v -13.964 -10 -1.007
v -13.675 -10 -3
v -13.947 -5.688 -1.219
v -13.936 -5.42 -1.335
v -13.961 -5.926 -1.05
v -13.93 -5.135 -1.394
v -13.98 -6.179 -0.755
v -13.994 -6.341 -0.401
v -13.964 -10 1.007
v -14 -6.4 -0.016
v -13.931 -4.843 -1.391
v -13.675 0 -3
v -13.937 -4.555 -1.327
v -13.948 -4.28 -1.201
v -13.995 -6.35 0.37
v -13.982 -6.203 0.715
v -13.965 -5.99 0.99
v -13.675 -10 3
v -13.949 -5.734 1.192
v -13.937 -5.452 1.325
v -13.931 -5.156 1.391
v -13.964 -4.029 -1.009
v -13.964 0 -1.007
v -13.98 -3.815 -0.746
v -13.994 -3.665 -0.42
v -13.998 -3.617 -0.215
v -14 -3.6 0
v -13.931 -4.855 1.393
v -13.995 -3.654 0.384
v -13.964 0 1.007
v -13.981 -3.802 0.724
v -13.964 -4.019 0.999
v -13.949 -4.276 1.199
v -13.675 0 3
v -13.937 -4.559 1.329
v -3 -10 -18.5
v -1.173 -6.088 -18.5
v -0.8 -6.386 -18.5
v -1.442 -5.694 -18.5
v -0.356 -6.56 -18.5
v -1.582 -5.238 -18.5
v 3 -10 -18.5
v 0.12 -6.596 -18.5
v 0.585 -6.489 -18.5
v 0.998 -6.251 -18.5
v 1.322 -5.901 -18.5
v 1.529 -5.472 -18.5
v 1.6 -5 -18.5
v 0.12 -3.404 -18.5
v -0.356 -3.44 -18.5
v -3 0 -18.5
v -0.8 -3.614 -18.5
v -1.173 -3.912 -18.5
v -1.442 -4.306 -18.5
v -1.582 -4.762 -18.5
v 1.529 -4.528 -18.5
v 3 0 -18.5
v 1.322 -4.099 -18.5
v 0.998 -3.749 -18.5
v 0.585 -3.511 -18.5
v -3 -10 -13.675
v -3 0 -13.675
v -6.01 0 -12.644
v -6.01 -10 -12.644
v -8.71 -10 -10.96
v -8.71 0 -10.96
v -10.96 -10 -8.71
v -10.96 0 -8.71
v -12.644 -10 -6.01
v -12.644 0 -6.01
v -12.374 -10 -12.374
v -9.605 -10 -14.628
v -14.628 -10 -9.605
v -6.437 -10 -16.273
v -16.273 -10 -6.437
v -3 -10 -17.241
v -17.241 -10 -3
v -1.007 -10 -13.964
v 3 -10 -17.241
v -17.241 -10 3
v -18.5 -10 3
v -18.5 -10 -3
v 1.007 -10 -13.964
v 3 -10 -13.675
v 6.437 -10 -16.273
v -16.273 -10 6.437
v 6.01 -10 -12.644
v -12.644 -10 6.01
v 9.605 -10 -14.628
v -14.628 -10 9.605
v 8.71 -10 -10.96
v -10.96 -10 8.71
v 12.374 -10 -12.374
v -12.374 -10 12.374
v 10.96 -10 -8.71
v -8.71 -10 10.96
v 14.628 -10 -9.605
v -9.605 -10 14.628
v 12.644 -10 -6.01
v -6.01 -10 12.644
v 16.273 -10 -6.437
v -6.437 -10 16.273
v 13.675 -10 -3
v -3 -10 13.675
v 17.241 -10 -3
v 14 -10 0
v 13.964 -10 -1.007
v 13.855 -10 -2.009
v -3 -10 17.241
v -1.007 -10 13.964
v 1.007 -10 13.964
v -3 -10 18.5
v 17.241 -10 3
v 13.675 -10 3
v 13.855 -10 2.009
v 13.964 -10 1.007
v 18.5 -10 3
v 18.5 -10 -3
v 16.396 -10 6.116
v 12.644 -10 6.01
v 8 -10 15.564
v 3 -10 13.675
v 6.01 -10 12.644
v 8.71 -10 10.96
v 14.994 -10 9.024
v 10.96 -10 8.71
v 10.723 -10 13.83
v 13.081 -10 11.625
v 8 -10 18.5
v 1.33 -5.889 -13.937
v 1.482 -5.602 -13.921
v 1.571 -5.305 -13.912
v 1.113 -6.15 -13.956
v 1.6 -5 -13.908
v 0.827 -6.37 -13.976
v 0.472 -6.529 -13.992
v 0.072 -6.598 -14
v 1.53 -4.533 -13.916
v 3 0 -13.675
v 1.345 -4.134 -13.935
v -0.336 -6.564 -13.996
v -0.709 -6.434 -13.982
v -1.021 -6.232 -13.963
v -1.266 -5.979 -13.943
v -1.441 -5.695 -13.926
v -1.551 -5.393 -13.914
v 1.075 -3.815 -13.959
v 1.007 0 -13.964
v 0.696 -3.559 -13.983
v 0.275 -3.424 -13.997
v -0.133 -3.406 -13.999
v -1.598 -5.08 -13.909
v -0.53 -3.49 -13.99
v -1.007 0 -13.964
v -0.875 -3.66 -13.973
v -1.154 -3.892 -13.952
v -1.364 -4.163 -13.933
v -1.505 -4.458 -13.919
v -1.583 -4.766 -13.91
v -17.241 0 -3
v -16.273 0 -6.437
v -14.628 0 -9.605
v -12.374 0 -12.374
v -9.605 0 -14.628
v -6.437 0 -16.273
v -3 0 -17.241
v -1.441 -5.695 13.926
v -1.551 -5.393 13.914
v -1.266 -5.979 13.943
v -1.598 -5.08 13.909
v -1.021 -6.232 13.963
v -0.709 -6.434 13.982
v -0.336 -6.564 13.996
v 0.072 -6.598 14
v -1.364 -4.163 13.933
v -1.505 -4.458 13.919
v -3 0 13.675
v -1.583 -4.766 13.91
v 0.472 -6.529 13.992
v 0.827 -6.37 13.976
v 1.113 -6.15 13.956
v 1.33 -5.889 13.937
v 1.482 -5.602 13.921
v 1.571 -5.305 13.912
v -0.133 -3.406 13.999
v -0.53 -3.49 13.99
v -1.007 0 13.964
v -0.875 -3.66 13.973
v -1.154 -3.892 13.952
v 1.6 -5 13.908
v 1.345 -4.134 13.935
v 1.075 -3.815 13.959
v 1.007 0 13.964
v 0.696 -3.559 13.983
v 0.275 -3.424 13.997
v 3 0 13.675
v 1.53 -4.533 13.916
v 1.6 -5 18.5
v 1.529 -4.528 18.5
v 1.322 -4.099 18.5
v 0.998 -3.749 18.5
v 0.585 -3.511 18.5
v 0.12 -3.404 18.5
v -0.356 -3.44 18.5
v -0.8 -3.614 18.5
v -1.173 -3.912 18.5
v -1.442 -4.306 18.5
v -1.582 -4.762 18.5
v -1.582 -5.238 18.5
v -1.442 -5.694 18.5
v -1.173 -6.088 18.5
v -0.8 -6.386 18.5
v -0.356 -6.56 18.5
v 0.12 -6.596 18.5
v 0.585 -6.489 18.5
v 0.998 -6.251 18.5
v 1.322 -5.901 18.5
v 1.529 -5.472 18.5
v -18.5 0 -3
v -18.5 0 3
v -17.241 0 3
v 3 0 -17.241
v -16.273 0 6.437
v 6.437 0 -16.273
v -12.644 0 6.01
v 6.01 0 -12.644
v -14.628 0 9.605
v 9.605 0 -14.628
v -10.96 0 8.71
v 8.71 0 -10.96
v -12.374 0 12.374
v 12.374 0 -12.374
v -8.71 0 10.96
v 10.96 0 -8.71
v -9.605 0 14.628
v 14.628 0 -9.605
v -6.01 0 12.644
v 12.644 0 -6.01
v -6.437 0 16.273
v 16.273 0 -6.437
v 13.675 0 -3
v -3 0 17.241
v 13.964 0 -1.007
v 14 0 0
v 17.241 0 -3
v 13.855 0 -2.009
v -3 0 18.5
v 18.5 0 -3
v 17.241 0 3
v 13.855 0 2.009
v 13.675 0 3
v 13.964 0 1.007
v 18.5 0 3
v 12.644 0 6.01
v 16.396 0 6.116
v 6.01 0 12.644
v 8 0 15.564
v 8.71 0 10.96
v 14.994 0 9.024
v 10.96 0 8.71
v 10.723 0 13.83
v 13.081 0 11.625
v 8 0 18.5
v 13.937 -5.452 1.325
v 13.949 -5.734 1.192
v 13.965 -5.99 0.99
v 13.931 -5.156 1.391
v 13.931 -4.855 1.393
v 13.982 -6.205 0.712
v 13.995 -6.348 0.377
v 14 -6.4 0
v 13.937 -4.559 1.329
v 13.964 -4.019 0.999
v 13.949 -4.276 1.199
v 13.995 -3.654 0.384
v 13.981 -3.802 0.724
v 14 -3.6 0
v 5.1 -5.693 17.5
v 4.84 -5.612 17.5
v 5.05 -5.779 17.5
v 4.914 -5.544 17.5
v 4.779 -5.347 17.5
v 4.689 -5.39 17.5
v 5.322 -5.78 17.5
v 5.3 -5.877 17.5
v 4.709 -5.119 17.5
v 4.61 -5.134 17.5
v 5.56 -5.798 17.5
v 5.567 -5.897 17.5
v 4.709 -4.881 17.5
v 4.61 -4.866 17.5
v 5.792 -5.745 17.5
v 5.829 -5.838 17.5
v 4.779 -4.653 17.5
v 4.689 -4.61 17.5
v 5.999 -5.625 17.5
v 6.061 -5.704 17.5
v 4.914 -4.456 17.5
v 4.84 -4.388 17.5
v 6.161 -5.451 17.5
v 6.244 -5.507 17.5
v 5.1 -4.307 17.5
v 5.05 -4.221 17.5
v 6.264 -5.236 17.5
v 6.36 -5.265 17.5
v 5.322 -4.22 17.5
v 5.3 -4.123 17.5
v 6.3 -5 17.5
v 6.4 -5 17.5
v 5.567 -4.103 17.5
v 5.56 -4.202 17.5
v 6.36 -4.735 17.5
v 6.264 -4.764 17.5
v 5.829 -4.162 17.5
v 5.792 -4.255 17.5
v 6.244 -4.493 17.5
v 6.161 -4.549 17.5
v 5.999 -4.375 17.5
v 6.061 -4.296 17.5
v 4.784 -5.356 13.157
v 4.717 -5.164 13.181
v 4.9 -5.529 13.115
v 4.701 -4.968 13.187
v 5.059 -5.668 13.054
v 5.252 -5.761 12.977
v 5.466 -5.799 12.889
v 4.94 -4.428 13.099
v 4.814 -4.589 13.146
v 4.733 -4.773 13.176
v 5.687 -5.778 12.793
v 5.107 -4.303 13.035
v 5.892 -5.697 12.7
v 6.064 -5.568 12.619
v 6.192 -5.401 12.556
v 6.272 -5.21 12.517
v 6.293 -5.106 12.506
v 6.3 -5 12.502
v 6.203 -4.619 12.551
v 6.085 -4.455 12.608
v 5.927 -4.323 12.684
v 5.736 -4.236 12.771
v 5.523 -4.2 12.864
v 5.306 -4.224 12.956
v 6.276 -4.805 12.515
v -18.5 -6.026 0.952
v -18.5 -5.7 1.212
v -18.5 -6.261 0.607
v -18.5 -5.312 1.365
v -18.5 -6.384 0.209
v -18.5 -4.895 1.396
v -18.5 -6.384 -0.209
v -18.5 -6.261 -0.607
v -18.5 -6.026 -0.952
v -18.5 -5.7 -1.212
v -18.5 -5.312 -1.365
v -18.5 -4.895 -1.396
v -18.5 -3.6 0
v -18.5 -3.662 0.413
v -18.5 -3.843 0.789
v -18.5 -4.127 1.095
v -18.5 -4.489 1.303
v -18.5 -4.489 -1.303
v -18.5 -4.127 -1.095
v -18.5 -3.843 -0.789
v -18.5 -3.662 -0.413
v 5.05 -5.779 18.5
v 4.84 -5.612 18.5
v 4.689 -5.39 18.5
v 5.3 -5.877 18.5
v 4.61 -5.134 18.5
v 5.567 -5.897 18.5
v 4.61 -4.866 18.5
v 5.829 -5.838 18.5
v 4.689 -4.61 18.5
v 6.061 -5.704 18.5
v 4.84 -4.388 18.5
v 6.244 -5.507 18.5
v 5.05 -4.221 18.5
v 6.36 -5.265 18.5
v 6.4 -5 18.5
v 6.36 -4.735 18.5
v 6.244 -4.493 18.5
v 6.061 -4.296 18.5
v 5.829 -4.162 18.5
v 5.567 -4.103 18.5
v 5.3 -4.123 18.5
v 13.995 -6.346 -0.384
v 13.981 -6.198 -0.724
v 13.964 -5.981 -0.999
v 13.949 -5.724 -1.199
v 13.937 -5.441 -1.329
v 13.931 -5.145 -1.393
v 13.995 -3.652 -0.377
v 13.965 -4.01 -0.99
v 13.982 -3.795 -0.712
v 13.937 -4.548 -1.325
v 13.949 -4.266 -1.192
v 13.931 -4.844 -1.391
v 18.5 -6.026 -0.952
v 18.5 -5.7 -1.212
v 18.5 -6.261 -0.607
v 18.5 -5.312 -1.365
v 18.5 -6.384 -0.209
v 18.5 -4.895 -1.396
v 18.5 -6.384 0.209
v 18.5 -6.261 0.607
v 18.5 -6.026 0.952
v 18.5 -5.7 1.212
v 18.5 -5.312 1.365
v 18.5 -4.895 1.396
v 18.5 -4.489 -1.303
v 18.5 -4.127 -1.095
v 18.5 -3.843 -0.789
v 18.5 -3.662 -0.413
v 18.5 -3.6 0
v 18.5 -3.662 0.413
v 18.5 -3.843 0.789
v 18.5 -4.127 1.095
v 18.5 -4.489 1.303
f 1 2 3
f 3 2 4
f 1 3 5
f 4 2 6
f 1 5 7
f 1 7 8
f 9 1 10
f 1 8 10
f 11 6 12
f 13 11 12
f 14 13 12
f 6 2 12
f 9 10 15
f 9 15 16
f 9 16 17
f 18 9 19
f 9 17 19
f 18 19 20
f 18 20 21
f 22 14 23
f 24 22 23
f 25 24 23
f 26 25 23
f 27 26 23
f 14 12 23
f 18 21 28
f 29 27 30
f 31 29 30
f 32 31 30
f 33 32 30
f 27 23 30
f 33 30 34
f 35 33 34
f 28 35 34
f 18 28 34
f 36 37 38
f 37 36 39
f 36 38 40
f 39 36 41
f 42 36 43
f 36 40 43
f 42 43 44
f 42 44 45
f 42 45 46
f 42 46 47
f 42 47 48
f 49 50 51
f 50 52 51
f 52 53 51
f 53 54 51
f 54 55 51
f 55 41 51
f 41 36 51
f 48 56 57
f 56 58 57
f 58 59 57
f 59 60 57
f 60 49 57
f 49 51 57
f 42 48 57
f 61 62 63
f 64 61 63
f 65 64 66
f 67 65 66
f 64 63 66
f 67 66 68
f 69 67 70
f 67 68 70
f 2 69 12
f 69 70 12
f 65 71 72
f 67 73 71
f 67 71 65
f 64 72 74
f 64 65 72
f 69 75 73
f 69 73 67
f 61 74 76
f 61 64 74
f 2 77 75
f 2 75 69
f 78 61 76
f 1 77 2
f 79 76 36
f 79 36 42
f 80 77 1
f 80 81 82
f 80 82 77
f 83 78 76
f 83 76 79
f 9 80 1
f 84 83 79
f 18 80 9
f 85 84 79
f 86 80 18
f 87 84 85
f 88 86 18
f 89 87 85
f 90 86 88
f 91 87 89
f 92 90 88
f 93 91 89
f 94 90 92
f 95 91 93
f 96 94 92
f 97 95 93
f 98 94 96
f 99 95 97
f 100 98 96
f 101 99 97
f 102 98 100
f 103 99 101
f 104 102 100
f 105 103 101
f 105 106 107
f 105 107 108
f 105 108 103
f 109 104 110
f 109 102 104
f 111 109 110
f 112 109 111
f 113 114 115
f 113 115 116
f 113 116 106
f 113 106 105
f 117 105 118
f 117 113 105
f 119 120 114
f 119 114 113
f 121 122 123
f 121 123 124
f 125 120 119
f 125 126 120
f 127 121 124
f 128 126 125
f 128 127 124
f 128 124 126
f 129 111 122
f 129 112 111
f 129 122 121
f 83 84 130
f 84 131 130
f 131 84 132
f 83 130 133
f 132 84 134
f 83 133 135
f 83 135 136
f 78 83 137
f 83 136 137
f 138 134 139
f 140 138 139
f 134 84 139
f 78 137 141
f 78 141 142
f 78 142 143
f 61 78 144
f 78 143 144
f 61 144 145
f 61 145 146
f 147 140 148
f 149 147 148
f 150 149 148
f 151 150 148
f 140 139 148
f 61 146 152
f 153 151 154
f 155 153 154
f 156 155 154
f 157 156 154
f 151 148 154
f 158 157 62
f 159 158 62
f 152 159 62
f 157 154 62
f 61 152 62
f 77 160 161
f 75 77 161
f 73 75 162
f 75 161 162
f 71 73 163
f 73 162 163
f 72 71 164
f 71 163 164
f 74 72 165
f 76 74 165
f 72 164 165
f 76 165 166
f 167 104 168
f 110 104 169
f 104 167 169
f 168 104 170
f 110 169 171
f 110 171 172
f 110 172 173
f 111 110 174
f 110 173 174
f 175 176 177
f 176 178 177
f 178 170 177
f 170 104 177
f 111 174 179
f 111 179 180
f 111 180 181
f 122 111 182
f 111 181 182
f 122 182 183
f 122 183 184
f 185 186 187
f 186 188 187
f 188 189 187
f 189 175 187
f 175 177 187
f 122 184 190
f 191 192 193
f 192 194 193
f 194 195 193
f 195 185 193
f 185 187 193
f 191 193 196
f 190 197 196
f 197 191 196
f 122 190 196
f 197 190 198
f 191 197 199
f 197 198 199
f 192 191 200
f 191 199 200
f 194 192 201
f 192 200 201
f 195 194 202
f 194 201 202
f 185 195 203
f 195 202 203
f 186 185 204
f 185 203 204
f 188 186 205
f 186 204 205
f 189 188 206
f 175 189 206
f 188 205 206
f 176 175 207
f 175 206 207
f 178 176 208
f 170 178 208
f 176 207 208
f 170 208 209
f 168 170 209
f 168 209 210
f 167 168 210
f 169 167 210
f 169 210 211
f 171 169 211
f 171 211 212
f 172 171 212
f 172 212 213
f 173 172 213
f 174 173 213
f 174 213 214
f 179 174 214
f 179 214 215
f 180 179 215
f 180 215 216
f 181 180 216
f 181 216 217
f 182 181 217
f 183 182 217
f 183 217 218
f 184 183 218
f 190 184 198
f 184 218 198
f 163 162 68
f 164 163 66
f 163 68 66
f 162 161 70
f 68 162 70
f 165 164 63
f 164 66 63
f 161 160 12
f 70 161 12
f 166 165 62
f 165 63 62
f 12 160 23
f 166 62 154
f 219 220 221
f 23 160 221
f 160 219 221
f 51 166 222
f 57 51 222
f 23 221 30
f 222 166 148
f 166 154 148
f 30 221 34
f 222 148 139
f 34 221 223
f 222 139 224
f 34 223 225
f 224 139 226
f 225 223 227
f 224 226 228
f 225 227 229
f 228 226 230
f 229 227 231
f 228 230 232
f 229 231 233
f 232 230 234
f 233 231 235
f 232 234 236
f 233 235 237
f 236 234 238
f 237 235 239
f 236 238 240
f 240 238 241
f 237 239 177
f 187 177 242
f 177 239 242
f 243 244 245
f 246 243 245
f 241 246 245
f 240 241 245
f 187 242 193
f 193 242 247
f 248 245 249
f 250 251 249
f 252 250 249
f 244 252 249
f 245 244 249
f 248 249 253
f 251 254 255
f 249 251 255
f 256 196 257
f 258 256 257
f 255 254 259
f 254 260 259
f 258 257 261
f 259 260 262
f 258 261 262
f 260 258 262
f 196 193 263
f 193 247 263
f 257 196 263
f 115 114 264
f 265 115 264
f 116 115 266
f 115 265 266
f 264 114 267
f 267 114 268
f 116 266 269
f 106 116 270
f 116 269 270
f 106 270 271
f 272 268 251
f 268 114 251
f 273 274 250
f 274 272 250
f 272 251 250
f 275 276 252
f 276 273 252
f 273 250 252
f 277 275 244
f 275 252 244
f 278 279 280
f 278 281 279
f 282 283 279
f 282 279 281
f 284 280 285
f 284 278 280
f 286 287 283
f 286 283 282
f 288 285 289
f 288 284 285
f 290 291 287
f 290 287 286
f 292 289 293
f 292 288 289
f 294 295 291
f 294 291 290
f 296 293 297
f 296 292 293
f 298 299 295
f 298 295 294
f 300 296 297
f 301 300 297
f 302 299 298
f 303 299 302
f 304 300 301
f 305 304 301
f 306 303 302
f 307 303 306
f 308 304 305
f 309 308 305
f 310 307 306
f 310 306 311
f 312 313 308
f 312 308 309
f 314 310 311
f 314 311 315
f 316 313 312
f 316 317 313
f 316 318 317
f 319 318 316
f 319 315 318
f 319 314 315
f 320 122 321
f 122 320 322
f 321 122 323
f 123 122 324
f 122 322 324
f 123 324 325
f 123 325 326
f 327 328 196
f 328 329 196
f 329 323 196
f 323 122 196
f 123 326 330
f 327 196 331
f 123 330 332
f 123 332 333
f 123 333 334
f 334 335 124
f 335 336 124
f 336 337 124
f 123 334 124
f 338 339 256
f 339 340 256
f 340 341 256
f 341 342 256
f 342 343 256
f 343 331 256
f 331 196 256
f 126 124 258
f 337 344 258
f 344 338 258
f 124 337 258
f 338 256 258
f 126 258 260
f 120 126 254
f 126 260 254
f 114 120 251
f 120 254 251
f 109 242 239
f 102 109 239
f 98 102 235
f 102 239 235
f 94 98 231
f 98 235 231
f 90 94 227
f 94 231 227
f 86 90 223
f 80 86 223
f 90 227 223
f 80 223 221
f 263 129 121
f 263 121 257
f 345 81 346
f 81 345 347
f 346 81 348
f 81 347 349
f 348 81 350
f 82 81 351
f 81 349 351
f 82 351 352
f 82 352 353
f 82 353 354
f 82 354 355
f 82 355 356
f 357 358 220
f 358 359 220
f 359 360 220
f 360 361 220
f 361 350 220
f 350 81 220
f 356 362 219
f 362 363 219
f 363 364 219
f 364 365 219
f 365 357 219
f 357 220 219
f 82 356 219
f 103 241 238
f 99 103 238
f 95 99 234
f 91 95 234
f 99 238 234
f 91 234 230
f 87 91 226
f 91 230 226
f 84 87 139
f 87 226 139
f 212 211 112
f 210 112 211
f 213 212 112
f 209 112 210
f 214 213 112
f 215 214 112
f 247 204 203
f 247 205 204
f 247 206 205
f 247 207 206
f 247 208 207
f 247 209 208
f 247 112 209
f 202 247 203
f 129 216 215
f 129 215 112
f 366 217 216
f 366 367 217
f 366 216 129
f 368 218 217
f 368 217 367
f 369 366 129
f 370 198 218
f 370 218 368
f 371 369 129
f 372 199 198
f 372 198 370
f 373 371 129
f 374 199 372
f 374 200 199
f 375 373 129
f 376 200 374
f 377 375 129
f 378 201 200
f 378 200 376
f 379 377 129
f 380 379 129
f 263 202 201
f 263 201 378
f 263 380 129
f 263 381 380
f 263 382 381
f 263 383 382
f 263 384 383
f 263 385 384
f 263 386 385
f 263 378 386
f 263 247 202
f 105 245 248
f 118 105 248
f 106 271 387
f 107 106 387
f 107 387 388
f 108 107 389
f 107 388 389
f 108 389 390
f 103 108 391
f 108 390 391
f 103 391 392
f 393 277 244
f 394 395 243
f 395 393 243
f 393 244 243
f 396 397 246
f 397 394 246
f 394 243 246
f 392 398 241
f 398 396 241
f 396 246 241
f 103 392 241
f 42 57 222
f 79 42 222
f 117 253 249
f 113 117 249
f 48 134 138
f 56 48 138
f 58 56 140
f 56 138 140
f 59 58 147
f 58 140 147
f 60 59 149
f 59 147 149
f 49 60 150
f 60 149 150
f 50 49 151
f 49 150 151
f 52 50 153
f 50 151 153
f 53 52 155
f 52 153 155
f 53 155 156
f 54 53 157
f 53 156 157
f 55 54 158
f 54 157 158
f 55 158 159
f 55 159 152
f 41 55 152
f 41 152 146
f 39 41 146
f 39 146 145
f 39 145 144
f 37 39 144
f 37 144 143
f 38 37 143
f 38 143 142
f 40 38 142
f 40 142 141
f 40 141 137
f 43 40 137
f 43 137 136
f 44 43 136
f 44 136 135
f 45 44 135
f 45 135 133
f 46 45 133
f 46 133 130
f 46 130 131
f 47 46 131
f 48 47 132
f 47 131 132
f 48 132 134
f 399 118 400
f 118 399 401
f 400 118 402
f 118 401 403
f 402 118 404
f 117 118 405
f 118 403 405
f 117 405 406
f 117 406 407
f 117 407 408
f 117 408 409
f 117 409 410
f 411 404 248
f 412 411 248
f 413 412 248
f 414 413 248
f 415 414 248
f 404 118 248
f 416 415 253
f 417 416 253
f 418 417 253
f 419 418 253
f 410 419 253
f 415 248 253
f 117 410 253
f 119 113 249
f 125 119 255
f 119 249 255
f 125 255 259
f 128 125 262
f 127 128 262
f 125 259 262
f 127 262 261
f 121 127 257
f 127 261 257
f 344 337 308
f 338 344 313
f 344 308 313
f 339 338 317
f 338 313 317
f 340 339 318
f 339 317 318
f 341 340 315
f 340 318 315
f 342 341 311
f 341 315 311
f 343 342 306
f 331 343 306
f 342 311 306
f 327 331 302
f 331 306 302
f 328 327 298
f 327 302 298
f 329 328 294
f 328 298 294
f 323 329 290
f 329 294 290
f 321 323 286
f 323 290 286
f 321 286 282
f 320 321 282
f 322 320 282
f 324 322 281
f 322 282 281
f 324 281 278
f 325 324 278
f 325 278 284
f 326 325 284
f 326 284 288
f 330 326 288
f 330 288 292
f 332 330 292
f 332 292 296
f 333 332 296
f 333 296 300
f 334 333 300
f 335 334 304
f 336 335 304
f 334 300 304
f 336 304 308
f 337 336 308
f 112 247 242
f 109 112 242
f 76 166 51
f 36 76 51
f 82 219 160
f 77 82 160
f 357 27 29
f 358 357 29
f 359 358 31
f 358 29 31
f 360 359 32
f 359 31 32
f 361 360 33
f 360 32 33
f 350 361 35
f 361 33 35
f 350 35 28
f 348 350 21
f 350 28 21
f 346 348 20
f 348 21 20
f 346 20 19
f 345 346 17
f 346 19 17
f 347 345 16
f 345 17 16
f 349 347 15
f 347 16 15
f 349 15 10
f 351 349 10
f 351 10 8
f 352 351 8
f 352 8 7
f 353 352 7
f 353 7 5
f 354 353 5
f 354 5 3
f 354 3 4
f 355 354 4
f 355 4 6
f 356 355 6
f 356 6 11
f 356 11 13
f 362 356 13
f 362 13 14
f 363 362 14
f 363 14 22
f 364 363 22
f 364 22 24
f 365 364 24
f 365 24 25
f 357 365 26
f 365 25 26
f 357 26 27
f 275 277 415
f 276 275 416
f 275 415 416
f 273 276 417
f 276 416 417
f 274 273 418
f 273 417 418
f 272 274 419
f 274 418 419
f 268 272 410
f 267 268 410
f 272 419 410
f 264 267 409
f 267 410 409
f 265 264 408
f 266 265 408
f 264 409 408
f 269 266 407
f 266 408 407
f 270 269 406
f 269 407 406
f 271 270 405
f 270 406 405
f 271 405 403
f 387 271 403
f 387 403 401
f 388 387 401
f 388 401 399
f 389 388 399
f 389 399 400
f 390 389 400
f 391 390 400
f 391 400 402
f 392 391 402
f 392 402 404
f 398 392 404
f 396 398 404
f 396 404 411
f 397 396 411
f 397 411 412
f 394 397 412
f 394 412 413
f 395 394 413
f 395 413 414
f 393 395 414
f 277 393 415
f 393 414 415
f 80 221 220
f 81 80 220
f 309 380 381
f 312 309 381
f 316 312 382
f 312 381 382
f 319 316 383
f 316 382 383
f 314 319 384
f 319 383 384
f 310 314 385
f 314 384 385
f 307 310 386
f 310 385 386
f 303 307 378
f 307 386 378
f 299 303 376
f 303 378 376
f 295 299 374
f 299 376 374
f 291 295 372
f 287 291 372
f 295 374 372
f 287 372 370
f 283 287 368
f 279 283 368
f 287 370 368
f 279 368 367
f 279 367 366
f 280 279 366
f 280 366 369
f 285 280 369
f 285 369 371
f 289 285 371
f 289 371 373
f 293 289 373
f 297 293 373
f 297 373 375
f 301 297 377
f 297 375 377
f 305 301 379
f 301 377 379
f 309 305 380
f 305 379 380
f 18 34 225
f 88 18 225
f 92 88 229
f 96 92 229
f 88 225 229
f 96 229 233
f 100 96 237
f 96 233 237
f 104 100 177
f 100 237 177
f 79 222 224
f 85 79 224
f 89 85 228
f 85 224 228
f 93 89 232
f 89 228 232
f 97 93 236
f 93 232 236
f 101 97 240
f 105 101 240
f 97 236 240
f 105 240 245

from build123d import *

# Parameters (mm, degrees)
F1_DEPTH  = 10
F2_R      = 1.6
F3_DEPTH  = 40
F4_R      = 1.4
F5_DEPTH  = 40
F6_W      = 5
F6_H      = 10
F7_DEPTH  = 4
F8_R      = 0.8
F9_DEPTH  = 7
F10_R     = 0.9
F11_DEPTH = 1


with BuildPart() as f1:
    # F0 (on Front) → F1 (new body)
    with BuildSketch(Plane.XZ):
        with BuildLine():
            ThreePointArc((13.6747943312, 3), (13.9184611333, 1.5087874873), (14, 0))
            ThreePointArc((14, 0), (13.9184611333, -1.5087874873), (13.6747943312, -3))
            Line((13.6747943312, -3), (17.2409396496, -3))
            ThreePointArc((17.2409396496, -3), (17.4351146235, -1.5055823014), (17.5, 0))
            ThreePointArc((17.5, 0), (17.4351146235, 1.5055823014), (17.2409396496, 3))
            Line((17.2409396496, 3), (13.6747943312, 3))
        make_face()
        with BuildLine():
            ThreePointArc((3, 13.6747943312), (9.8994949366, 9.8994949366), (13.6747943312, 3))
            Line((13.6747943312, 3), (17.2409396496, 3))
            ThreePointArc((17.2409396496, 3), (12.3743686708, 12.3743686708), (3, 17.2409396496))
            Line((3, 17.2409396496), (3, 13.6747943312))
        make_face()
        with BuildLine():
            Line((17.2409396496, -3), (13.6747943312, -3))
            ThreePointArc((13.6747943312, -3), (9.8994949366, -9.8994949366), (3, -13.6747943312))
            Line((3, -13.6747943312), (3, -17.2409396496))
            ThreePointArc((3, -17.2409396496), (12.3743686708, -12.3743686708), (17.2409396496, -3))
        make_face()
        with BuildLine():
            ThreePointArc((-3, 13.6747943312), (0, 14), (3, 13.6747943312))
            Line((3, 13.6747943312), (3, 17.2409396496))
            ThreePointArc((3, 17.2409396496), (0, 17.5), (-3, 17.2409396496))
            Line((-3, 17.2409396496), (-3, 13.6747943312))
        make_face()
        with BuildLine():
            Line((18.5, 3), (17.2409396496, 3))
            ThreePointArc((17.2409396496, 3), (17.4351146235, 1.5055823014), (17.5, 0))
            ThreePointArc((17.5, 0), (17.4351146235, -1.5055823014), (17.2409396496, -3))
            Line((17.2409396496, -3), (18.5, -3))
            Line((18.5, -3), (18.5, 3))
        make_face()
        with BuildLine():
            Line((3, -17.2409396496), (3, -13.6747943312))
            ThreePointArc((3, -13.6747943312), (0, -14), (-3, -13.6747943312))
            Line((-3, -13.6747943312), (-3, -17.2409396496))
            ThreePointArc((-3, -17.2409396496), (0, -17.5), (3, -17.2409396496))
        make_face()
        with BuildLine():
            ThreePointArc((-13.6747943312, 3), (-9.8994949366, 9.8994949366), (-3, 13.6747943312))
            Line((-3, 13.6747943312), (-3, 17.2409396496))
            ThreePointArc((-3, 17.2409396496), (-12.3743686708, 12.3743686708), (-17.2409396496, 3))
            Line((-17.2409396496, 3), (-13.6747943312, 3))
        make_face()
        with BuildLine():
            ThreePointArc((-3, 17.2409396496), (0, 17.5), (3, 17.2409396496))
            Line((3, 17.2409396496), (3, 18.5))
            Line((3, 18.5), (-3, 18.5))
            Line((-3, 18.5), (-3, 17.2409396496))
        make_face()
        with BuildLine():
            Line((-3, -17.2409396496), (-3, -13.6747943312))
            ThreePointArc((-3, -13.6747943312), (-9.8994949366, -9.8994949366), (-13.6747943312, -3))
            Line((-13.6747943312, -3), (-17.2409396496, -3))
            ThreePointArc((-17.2409396496, -3), (-12.3743686708, -12.3743686708), (-3, -17.2409396496))
        make_face()
        with BuildLine():
            Line((3, -18.5), (3, -17.2409396496))
            ThreePointArc((3, -17.2409396496), (0, -17.5), (-3, -17.2409396496))
            Line((-3, -17.2409396496), (-3, -18.5))
            Line((-3, -18.5), (3, -18.5))
        make_face()
        with BuildLine():
            ThreePointArc((-13.6747943312, -3), (-14, 0), (-13.6747943312, 3))
            Line((-13.6747943312, 3), (-17.2409396496, 3))
            ThreePointArc((-17.2409396496, 3), (-17.5, 0), (-17.2409396496, -3))
            Line((-17.2409396496, -3), (-13.6747943312, -3))
        make_face()
        with BuildLine():
            ThreePointArc((-17.2409396496, -3), (-17.5, 0), (-17.2409396496, 3))
            Line((-17.2409396496, 3), (-18.5, 3))
            Line((-18.5, 3), (-18.5, -3))
            Line((-18.5, -3), (-17.2409396496, -3))
        make_face()
    extrude(amount=F1_DEPTH)

    # F2 (on face) → F3 (cut)
    with BuildSketch(Plane.XY.offset(18.5)):
        with Locations((0, -5)):
            Circle(F2_R)
    extrude(amount=-F3_DEPTH, mode=Mode.SUBTRACT)

    # F4 (on face) → F5 (cut)
    with BuildSketch(Plane.YZ.offset(18.5)):
        with Locations((-5, 0)):
            Circle(F4_R)
    extrude(amount=-F5_DEPTH, mode=Mode.SUBTRACT)

    # F6 (on face) → F7 (join)
    with BuildSketch(Plane.XY.offset(18.5)):
        with Locations((5.5, -5)):
            Rectangle(F6_W, F6_H)
    extrude(amount=-F7_DEPTH)

    # F8 (on face) → F9 (cut)
    with BuildSketch(Plane.XY.offset(18.5)):
        with Locations((5.5, -5)):
            Circle(F8_R)
    extrude(amount=-F9_DEPTH, mode=Mode.SUBTRACT)

    # F10 (on face) → F11 (cut)
    with BuildSketch(Plane.XY.offset(18.5)):
        with Locations((5.5, -5)):
            Circle(F10_R)
    extrude(amount=-F11_DEPTH, mode=Mode.SUBTRACT)


solid = f1.part
